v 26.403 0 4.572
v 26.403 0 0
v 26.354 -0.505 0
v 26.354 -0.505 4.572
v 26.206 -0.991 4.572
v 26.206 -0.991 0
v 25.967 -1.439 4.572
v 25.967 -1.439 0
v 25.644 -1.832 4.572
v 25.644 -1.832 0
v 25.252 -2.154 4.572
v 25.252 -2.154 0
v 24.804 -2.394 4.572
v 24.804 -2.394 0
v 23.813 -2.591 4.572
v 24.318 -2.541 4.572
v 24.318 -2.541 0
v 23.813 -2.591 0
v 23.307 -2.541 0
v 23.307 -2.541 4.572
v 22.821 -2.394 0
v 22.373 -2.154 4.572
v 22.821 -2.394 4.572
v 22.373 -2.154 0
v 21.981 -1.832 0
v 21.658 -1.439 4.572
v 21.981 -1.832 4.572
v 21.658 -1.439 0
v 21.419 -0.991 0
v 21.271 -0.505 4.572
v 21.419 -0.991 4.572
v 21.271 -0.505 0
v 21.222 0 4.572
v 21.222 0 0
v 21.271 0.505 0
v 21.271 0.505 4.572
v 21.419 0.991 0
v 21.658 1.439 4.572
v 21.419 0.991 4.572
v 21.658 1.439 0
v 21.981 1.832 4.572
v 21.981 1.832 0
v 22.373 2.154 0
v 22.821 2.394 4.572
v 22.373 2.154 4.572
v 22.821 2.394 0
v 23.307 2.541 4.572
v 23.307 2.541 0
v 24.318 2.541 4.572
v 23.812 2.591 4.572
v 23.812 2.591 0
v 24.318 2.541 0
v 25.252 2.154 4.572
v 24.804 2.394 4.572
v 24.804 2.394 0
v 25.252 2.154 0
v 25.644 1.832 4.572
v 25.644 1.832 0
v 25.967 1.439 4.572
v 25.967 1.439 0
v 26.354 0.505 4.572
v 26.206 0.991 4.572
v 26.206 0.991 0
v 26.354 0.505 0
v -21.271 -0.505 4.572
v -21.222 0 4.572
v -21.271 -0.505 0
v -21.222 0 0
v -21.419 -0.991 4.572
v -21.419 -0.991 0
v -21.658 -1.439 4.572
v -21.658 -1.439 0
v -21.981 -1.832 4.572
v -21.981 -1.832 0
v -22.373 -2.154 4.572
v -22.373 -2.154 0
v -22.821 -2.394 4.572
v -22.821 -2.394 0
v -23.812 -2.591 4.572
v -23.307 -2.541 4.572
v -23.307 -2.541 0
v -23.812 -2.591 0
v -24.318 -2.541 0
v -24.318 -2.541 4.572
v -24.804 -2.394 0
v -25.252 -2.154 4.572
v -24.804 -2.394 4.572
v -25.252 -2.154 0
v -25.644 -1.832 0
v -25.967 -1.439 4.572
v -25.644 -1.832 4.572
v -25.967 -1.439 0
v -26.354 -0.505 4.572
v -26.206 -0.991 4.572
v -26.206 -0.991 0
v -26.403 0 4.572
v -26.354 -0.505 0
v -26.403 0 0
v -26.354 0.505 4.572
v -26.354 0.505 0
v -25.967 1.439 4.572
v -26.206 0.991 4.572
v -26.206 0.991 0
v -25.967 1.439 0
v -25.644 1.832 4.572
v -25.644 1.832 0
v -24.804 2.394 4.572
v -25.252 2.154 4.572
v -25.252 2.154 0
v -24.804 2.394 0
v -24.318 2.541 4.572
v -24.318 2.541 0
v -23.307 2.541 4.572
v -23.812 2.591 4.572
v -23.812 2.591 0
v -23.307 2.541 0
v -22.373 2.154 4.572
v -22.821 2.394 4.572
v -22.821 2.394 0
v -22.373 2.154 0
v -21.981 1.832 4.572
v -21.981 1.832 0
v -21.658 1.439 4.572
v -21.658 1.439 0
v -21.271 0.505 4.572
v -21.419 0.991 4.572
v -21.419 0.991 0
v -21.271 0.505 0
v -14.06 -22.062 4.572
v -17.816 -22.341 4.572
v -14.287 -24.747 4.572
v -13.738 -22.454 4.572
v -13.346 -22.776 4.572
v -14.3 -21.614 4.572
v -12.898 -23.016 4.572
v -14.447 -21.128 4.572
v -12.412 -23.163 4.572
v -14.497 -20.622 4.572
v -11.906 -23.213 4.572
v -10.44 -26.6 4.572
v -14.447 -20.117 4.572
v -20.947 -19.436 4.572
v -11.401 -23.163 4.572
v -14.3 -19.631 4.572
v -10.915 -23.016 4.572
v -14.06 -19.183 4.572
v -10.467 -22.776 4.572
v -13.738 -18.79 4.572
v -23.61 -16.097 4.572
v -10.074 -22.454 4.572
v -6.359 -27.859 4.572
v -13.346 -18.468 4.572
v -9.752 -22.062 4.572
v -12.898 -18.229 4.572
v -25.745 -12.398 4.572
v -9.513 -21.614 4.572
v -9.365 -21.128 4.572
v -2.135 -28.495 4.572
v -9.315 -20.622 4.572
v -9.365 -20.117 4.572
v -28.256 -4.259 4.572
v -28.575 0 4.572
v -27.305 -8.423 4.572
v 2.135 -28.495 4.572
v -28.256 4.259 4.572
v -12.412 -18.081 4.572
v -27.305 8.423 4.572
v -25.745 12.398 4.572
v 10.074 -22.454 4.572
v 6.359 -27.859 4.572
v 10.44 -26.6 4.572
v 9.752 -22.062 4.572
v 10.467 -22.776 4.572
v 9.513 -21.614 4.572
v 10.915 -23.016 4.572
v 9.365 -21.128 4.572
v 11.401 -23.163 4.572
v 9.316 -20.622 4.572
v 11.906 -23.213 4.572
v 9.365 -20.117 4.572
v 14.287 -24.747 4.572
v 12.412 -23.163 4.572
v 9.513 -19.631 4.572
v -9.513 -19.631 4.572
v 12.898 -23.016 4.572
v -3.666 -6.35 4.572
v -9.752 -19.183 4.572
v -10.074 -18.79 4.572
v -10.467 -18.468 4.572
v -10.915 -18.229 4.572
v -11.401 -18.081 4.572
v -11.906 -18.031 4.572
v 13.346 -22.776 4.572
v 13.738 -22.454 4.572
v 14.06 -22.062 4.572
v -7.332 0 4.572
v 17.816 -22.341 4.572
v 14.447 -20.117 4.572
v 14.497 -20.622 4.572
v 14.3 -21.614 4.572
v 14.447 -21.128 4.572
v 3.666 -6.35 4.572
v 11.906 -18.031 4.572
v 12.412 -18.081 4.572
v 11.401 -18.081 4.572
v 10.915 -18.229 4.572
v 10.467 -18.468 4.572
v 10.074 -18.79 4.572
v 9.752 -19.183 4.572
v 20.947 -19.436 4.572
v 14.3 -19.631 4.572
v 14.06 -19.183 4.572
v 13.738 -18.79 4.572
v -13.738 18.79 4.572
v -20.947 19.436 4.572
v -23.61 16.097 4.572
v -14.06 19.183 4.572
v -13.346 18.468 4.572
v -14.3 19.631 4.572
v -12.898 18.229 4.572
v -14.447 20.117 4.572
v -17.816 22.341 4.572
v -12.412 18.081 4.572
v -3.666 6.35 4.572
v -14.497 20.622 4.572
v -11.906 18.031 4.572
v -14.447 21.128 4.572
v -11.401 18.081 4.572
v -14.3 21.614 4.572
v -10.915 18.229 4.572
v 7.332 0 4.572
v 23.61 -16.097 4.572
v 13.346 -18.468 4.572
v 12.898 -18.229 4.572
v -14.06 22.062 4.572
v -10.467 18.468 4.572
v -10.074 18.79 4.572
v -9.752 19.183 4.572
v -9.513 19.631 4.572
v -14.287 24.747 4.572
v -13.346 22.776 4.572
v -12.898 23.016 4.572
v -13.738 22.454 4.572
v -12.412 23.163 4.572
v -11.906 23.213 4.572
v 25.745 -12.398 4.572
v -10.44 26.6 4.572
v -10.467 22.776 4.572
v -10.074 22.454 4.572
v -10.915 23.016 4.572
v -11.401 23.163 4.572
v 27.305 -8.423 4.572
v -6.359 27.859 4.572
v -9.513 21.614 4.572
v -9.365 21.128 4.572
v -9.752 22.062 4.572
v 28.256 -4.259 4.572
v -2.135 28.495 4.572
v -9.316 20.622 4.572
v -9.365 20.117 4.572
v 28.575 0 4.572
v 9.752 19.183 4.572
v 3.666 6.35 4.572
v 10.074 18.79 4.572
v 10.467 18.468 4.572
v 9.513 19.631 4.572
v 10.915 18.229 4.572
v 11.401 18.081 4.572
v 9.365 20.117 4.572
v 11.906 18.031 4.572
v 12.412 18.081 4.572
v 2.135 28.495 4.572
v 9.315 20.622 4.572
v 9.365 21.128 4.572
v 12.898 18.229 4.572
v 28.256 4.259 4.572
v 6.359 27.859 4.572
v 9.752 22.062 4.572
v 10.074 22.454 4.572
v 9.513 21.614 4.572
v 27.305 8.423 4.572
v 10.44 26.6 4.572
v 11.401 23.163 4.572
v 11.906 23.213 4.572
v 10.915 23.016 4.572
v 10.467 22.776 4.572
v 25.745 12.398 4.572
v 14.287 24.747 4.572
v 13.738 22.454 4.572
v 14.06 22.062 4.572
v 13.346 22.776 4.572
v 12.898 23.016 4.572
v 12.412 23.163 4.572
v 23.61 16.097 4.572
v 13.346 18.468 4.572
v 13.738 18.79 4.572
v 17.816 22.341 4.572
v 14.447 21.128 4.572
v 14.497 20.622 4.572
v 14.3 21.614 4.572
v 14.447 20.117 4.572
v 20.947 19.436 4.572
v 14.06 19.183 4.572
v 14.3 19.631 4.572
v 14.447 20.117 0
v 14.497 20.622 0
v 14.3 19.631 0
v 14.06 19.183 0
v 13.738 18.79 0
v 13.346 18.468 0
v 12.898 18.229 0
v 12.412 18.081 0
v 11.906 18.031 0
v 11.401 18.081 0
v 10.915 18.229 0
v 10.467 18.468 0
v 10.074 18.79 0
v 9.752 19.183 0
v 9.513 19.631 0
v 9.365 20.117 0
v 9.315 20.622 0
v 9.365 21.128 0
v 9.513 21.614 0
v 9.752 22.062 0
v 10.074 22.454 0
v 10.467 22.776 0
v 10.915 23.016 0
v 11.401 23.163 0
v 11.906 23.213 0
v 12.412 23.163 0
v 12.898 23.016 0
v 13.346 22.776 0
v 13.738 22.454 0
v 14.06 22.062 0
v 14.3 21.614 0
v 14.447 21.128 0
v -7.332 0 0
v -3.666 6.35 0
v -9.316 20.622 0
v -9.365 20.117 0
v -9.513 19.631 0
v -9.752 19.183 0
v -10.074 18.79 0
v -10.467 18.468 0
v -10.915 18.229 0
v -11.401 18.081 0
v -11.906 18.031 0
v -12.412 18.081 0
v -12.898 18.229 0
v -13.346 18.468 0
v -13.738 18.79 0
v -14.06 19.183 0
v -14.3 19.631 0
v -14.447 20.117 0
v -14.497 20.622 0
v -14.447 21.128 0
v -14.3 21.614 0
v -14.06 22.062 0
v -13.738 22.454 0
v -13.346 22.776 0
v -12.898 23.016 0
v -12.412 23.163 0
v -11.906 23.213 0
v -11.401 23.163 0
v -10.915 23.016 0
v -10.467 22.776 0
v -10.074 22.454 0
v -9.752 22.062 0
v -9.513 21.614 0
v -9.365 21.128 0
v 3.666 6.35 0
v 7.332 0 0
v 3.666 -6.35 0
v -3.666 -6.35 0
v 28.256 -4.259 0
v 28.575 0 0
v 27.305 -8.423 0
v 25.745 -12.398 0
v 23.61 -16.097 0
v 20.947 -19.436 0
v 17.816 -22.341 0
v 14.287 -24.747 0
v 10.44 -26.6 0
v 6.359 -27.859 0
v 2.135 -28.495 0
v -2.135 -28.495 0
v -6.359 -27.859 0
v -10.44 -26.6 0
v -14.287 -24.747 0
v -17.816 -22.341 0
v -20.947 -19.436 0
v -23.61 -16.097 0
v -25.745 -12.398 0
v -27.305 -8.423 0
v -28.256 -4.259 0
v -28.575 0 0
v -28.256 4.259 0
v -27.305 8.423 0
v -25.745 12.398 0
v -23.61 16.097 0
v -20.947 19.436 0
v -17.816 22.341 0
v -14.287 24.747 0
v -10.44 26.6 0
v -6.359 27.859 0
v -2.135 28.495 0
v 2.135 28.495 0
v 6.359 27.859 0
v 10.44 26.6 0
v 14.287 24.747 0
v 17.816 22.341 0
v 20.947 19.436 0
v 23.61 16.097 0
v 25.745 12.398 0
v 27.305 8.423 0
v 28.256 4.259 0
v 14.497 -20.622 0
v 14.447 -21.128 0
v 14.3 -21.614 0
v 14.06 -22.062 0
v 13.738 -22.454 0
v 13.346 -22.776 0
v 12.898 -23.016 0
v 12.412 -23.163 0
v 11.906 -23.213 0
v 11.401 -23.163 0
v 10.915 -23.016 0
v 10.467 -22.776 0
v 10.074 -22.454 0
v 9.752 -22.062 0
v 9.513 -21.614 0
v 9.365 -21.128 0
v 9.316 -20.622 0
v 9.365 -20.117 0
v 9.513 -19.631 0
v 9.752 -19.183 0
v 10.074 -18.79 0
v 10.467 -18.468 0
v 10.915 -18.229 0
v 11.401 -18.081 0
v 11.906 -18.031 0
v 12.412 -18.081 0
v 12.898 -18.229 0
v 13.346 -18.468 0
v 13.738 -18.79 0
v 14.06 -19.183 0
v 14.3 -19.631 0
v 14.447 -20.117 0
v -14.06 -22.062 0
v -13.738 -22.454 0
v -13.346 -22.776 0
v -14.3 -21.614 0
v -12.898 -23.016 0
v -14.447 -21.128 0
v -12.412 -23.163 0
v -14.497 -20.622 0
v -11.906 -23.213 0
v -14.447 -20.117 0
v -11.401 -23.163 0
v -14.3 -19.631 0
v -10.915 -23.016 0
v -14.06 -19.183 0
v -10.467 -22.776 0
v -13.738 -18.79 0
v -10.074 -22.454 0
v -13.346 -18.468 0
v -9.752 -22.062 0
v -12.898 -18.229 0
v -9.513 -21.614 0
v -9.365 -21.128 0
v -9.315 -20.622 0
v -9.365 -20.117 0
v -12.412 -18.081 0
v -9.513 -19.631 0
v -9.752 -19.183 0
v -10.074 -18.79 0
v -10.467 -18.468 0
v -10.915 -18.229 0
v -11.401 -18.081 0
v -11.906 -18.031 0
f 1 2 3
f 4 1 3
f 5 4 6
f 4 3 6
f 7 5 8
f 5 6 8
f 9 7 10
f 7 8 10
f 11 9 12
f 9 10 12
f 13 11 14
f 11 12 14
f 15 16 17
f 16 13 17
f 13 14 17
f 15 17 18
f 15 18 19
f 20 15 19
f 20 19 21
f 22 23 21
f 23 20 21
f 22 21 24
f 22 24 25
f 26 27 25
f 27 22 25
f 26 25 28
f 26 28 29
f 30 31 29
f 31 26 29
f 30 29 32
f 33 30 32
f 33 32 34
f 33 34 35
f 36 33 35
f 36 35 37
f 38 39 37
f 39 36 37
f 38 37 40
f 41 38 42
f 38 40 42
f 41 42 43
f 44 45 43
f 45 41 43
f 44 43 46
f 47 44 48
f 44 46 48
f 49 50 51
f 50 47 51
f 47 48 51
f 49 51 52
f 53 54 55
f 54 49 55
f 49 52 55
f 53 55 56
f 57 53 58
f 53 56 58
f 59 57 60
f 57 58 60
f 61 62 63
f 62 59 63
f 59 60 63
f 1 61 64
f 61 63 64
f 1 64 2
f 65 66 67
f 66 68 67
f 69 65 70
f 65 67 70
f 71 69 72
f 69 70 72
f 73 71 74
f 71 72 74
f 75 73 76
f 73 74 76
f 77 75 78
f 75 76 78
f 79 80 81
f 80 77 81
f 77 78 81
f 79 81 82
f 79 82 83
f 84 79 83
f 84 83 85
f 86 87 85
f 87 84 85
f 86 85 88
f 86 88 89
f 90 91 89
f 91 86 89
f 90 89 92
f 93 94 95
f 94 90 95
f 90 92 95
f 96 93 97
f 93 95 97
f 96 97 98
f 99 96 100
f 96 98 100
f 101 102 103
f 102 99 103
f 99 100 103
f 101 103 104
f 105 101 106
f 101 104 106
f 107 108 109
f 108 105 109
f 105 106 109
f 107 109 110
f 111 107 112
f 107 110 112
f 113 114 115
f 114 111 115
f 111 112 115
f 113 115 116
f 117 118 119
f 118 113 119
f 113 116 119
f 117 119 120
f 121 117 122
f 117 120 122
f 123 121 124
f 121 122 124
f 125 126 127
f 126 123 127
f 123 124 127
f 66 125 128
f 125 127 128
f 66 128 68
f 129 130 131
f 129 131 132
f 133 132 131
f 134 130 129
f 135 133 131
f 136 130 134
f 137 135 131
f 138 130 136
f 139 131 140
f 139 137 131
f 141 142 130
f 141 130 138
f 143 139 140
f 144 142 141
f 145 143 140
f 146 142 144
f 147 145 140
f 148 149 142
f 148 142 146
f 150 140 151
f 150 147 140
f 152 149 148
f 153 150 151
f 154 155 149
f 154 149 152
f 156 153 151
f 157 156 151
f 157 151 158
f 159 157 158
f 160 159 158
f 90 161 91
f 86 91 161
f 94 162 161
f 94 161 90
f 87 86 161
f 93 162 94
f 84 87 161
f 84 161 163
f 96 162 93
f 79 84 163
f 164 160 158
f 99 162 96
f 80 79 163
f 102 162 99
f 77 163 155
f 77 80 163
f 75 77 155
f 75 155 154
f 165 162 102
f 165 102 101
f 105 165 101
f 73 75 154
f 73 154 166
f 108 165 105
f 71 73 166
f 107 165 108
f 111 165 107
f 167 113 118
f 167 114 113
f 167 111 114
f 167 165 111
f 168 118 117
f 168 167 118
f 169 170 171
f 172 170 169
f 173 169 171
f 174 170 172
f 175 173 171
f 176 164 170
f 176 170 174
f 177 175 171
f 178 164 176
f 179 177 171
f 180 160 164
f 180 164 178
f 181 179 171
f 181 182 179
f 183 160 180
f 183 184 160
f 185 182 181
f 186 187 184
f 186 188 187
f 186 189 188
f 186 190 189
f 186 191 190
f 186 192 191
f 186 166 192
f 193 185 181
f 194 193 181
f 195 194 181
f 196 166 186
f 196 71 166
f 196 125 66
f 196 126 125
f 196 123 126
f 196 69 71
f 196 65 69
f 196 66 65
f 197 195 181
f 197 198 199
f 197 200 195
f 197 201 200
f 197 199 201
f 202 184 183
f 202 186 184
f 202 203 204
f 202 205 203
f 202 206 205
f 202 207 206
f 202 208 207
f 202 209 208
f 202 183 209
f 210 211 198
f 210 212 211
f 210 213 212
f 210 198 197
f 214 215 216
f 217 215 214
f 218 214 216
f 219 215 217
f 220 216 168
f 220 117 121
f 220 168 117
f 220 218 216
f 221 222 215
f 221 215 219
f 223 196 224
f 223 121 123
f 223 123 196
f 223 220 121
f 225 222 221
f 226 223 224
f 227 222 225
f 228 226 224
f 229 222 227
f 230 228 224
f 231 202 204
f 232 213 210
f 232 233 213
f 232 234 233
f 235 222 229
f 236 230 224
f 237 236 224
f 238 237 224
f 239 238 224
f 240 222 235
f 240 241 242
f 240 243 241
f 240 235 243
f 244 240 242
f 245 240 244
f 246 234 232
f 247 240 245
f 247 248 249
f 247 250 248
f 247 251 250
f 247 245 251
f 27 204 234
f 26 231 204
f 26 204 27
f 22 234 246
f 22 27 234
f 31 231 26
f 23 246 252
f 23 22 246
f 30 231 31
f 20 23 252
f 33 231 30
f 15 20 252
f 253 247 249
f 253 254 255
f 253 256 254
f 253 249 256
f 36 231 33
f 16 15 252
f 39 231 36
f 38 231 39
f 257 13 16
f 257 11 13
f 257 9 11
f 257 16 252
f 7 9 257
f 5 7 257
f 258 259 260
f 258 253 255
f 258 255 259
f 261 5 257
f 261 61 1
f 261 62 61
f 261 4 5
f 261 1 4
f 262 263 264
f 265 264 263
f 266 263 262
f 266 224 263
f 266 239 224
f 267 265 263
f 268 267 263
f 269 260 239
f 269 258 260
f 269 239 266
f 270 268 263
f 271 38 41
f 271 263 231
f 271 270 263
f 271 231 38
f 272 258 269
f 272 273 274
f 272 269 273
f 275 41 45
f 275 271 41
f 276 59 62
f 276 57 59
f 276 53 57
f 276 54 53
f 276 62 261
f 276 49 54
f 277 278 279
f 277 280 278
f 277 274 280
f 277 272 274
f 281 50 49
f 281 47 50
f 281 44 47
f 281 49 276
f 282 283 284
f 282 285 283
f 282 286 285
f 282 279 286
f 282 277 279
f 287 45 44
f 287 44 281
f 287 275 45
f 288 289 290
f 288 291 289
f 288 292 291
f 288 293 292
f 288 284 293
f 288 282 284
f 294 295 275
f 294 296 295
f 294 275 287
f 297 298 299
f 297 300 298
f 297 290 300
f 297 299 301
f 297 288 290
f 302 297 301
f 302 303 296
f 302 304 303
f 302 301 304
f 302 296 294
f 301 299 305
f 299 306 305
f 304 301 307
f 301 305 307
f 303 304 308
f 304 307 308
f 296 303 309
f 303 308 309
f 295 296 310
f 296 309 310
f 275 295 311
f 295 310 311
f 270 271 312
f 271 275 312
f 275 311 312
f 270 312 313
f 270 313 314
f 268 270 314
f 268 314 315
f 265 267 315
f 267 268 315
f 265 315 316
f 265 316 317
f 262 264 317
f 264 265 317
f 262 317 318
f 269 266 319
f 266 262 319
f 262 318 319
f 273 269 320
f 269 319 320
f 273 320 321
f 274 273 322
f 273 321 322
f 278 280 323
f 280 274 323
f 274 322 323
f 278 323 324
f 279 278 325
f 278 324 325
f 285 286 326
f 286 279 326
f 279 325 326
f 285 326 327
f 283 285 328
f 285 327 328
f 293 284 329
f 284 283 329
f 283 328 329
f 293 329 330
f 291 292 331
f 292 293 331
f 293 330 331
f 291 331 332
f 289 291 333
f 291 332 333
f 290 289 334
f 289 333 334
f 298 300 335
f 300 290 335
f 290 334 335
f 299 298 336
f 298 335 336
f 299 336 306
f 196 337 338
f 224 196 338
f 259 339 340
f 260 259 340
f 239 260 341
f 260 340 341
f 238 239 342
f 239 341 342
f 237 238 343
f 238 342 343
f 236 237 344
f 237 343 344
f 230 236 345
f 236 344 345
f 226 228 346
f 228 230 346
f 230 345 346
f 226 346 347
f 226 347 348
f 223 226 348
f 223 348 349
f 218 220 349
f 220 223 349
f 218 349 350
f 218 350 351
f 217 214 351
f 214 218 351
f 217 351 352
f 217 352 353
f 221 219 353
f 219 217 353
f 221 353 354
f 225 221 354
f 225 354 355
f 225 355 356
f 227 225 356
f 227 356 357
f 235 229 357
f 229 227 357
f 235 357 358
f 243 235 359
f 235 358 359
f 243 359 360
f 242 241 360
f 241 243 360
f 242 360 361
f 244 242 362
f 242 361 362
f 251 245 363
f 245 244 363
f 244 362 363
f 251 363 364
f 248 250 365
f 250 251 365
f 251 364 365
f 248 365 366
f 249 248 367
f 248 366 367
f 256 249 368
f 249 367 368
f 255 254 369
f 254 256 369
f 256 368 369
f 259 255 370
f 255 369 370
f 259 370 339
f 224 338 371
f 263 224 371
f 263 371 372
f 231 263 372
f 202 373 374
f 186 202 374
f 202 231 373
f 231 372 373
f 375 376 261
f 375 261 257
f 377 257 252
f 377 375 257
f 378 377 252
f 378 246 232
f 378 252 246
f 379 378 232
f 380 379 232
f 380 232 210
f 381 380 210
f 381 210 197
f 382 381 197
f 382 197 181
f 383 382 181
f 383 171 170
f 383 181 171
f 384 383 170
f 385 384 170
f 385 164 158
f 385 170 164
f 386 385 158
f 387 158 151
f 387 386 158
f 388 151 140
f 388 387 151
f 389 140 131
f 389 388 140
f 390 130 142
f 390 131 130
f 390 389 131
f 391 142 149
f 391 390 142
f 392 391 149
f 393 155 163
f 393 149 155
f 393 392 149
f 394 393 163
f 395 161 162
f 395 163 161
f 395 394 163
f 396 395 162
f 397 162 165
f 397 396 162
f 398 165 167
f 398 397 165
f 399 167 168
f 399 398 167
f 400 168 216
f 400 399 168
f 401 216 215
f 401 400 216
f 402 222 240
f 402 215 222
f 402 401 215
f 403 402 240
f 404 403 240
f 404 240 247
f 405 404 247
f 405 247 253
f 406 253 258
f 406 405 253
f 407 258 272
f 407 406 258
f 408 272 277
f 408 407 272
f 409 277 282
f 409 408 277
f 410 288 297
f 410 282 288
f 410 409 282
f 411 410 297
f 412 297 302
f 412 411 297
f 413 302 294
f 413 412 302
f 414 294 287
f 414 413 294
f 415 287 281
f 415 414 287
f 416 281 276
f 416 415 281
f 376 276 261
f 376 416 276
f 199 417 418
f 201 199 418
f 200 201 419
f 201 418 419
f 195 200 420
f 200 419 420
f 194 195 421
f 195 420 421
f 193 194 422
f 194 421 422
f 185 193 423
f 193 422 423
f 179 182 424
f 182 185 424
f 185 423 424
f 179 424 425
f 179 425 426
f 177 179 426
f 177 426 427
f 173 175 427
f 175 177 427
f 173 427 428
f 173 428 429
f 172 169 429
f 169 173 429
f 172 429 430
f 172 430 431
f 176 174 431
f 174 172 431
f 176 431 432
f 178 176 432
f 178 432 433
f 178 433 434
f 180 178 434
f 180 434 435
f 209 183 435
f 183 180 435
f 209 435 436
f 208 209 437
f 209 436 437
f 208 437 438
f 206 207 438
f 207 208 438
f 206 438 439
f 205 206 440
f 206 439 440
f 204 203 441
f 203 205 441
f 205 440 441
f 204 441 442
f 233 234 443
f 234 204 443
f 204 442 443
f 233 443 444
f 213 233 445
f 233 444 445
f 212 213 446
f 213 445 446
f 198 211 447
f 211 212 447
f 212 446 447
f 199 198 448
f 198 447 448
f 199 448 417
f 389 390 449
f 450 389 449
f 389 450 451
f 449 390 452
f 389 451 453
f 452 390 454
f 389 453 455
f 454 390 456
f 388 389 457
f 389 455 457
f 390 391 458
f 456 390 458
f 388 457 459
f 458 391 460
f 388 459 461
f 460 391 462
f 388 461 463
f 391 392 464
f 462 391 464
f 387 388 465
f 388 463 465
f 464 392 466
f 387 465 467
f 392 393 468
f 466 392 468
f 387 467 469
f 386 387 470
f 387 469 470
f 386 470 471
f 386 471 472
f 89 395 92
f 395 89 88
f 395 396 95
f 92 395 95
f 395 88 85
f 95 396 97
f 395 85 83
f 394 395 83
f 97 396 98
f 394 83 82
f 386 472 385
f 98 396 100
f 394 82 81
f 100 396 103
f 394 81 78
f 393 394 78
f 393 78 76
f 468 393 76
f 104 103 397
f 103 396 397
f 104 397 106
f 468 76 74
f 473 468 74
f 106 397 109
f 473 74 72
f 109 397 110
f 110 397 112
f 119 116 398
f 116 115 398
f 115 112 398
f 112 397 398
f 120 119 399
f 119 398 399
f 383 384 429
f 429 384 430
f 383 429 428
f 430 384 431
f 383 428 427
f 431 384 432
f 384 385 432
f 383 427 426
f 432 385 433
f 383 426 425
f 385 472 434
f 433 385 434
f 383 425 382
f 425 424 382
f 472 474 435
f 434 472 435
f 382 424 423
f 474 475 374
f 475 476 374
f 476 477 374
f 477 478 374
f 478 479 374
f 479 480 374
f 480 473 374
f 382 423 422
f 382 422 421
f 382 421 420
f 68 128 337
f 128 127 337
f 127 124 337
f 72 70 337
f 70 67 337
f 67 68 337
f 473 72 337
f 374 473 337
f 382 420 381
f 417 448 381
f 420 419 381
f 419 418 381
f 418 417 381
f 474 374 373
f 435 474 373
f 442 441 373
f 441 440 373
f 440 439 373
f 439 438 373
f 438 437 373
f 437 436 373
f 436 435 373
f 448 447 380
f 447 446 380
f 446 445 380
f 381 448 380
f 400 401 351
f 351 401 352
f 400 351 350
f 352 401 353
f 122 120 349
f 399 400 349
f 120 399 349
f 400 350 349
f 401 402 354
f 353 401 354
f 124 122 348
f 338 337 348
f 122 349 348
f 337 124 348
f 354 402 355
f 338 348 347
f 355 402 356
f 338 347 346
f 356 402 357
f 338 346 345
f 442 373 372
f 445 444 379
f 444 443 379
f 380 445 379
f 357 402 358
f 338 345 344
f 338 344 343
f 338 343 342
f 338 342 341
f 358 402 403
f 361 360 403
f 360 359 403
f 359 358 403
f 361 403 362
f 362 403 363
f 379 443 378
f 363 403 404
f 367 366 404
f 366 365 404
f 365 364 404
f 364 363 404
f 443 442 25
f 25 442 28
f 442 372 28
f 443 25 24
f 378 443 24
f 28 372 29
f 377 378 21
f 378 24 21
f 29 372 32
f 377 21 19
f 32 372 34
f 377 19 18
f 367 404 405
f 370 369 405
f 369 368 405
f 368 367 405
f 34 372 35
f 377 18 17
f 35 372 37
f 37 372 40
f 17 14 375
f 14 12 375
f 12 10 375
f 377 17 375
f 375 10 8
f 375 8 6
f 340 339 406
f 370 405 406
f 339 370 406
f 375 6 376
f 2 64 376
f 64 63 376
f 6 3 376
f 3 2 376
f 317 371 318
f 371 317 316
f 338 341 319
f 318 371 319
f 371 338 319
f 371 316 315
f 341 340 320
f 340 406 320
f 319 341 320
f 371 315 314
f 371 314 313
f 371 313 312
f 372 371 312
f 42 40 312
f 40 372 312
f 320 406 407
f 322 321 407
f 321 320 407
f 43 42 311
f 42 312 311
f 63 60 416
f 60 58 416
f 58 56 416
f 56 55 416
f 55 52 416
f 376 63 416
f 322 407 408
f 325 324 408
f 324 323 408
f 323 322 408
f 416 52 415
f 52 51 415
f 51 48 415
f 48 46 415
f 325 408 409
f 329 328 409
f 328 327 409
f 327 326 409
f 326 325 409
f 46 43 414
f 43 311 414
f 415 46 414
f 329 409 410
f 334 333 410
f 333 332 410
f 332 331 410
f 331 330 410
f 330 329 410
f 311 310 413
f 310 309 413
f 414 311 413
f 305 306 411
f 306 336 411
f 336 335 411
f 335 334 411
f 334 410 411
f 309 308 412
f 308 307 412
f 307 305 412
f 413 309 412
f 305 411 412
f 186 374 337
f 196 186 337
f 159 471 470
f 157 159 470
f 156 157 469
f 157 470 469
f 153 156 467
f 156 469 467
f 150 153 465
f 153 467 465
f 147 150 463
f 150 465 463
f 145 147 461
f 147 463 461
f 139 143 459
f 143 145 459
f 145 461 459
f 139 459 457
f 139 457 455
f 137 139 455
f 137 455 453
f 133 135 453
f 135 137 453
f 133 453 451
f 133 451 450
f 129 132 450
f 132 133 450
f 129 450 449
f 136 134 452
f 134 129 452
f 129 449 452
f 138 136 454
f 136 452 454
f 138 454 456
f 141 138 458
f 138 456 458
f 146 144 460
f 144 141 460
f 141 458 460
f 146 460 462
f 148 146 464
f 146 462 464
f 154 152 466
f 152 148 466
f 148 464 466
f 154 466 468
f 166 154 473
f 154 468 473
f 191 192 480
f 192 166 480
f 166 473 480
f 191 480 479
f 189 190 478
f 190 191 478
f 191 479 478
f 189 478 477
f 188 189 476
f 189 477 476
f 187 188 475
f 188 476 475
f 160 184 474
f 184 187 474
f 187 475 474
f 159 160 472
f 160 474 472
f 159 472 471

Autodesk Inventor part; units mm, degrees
ref_plane "YZ Plane" through (0, 0, 0) normal (1, 0, 0) x (0, 1, 0)
ref_plane "XZ Plane" through (0, 0, 0) normal (0, 1, 0) x (-1, 0, 0)
ref_plane "XY Plane" through (0, 0, 0) normal (0, 0, 1) x (1, 0, 0)
sketch "Sketch1" plane through (0, 0, 0) normal (0, 0, 1) x (1, 0, 0)
  circle A0 centre (0, 0) radius 28.575
  circle A1 centre (-23.8125, 0) radius 2.5908
  line L0 (7.3323, 0) -> (3.6662, -6.35)
  line L1 (3.6662, -6.35) -> (-3.6662, -6.35)
  line L2 (-3.6662, -6.35) -> (-7.3323, 0)
  line L3 (-7.3323, 0) -> (-3.6662, 6.35)
  line L4 (-3.6662, 6.35) -> (3.6662, 6.35)
  line L5 (3.6662, 6.35) -> (7.3323, 0)
  line L6 (-23.8125, 0) -> (0, 0) construction
  circle A2 centre (-11.9063, 20.6222) radius 2.5908
  circle A3 centre (11.9062, 20.6222) radius 2.5908
  circle A4 centre (23.8125, 0) radius 2.5908
  circle A5 centre (11.9063, -20.6222) radius 2.5908
  circle A6 centre (-11.9062, -20.6222) radius 2.5908
  dimension "d0" = 57.15
  dimension "d1" = 5.1816
  dimension "d2" = 12.7
  dimension "d3" = 23.8125
  dimension "d6" = 360
extrude "Extrusion1" add sketch "Sketch1" along normal blind 4.572
properties part number "Custom Hex Hub" material "Steel"
